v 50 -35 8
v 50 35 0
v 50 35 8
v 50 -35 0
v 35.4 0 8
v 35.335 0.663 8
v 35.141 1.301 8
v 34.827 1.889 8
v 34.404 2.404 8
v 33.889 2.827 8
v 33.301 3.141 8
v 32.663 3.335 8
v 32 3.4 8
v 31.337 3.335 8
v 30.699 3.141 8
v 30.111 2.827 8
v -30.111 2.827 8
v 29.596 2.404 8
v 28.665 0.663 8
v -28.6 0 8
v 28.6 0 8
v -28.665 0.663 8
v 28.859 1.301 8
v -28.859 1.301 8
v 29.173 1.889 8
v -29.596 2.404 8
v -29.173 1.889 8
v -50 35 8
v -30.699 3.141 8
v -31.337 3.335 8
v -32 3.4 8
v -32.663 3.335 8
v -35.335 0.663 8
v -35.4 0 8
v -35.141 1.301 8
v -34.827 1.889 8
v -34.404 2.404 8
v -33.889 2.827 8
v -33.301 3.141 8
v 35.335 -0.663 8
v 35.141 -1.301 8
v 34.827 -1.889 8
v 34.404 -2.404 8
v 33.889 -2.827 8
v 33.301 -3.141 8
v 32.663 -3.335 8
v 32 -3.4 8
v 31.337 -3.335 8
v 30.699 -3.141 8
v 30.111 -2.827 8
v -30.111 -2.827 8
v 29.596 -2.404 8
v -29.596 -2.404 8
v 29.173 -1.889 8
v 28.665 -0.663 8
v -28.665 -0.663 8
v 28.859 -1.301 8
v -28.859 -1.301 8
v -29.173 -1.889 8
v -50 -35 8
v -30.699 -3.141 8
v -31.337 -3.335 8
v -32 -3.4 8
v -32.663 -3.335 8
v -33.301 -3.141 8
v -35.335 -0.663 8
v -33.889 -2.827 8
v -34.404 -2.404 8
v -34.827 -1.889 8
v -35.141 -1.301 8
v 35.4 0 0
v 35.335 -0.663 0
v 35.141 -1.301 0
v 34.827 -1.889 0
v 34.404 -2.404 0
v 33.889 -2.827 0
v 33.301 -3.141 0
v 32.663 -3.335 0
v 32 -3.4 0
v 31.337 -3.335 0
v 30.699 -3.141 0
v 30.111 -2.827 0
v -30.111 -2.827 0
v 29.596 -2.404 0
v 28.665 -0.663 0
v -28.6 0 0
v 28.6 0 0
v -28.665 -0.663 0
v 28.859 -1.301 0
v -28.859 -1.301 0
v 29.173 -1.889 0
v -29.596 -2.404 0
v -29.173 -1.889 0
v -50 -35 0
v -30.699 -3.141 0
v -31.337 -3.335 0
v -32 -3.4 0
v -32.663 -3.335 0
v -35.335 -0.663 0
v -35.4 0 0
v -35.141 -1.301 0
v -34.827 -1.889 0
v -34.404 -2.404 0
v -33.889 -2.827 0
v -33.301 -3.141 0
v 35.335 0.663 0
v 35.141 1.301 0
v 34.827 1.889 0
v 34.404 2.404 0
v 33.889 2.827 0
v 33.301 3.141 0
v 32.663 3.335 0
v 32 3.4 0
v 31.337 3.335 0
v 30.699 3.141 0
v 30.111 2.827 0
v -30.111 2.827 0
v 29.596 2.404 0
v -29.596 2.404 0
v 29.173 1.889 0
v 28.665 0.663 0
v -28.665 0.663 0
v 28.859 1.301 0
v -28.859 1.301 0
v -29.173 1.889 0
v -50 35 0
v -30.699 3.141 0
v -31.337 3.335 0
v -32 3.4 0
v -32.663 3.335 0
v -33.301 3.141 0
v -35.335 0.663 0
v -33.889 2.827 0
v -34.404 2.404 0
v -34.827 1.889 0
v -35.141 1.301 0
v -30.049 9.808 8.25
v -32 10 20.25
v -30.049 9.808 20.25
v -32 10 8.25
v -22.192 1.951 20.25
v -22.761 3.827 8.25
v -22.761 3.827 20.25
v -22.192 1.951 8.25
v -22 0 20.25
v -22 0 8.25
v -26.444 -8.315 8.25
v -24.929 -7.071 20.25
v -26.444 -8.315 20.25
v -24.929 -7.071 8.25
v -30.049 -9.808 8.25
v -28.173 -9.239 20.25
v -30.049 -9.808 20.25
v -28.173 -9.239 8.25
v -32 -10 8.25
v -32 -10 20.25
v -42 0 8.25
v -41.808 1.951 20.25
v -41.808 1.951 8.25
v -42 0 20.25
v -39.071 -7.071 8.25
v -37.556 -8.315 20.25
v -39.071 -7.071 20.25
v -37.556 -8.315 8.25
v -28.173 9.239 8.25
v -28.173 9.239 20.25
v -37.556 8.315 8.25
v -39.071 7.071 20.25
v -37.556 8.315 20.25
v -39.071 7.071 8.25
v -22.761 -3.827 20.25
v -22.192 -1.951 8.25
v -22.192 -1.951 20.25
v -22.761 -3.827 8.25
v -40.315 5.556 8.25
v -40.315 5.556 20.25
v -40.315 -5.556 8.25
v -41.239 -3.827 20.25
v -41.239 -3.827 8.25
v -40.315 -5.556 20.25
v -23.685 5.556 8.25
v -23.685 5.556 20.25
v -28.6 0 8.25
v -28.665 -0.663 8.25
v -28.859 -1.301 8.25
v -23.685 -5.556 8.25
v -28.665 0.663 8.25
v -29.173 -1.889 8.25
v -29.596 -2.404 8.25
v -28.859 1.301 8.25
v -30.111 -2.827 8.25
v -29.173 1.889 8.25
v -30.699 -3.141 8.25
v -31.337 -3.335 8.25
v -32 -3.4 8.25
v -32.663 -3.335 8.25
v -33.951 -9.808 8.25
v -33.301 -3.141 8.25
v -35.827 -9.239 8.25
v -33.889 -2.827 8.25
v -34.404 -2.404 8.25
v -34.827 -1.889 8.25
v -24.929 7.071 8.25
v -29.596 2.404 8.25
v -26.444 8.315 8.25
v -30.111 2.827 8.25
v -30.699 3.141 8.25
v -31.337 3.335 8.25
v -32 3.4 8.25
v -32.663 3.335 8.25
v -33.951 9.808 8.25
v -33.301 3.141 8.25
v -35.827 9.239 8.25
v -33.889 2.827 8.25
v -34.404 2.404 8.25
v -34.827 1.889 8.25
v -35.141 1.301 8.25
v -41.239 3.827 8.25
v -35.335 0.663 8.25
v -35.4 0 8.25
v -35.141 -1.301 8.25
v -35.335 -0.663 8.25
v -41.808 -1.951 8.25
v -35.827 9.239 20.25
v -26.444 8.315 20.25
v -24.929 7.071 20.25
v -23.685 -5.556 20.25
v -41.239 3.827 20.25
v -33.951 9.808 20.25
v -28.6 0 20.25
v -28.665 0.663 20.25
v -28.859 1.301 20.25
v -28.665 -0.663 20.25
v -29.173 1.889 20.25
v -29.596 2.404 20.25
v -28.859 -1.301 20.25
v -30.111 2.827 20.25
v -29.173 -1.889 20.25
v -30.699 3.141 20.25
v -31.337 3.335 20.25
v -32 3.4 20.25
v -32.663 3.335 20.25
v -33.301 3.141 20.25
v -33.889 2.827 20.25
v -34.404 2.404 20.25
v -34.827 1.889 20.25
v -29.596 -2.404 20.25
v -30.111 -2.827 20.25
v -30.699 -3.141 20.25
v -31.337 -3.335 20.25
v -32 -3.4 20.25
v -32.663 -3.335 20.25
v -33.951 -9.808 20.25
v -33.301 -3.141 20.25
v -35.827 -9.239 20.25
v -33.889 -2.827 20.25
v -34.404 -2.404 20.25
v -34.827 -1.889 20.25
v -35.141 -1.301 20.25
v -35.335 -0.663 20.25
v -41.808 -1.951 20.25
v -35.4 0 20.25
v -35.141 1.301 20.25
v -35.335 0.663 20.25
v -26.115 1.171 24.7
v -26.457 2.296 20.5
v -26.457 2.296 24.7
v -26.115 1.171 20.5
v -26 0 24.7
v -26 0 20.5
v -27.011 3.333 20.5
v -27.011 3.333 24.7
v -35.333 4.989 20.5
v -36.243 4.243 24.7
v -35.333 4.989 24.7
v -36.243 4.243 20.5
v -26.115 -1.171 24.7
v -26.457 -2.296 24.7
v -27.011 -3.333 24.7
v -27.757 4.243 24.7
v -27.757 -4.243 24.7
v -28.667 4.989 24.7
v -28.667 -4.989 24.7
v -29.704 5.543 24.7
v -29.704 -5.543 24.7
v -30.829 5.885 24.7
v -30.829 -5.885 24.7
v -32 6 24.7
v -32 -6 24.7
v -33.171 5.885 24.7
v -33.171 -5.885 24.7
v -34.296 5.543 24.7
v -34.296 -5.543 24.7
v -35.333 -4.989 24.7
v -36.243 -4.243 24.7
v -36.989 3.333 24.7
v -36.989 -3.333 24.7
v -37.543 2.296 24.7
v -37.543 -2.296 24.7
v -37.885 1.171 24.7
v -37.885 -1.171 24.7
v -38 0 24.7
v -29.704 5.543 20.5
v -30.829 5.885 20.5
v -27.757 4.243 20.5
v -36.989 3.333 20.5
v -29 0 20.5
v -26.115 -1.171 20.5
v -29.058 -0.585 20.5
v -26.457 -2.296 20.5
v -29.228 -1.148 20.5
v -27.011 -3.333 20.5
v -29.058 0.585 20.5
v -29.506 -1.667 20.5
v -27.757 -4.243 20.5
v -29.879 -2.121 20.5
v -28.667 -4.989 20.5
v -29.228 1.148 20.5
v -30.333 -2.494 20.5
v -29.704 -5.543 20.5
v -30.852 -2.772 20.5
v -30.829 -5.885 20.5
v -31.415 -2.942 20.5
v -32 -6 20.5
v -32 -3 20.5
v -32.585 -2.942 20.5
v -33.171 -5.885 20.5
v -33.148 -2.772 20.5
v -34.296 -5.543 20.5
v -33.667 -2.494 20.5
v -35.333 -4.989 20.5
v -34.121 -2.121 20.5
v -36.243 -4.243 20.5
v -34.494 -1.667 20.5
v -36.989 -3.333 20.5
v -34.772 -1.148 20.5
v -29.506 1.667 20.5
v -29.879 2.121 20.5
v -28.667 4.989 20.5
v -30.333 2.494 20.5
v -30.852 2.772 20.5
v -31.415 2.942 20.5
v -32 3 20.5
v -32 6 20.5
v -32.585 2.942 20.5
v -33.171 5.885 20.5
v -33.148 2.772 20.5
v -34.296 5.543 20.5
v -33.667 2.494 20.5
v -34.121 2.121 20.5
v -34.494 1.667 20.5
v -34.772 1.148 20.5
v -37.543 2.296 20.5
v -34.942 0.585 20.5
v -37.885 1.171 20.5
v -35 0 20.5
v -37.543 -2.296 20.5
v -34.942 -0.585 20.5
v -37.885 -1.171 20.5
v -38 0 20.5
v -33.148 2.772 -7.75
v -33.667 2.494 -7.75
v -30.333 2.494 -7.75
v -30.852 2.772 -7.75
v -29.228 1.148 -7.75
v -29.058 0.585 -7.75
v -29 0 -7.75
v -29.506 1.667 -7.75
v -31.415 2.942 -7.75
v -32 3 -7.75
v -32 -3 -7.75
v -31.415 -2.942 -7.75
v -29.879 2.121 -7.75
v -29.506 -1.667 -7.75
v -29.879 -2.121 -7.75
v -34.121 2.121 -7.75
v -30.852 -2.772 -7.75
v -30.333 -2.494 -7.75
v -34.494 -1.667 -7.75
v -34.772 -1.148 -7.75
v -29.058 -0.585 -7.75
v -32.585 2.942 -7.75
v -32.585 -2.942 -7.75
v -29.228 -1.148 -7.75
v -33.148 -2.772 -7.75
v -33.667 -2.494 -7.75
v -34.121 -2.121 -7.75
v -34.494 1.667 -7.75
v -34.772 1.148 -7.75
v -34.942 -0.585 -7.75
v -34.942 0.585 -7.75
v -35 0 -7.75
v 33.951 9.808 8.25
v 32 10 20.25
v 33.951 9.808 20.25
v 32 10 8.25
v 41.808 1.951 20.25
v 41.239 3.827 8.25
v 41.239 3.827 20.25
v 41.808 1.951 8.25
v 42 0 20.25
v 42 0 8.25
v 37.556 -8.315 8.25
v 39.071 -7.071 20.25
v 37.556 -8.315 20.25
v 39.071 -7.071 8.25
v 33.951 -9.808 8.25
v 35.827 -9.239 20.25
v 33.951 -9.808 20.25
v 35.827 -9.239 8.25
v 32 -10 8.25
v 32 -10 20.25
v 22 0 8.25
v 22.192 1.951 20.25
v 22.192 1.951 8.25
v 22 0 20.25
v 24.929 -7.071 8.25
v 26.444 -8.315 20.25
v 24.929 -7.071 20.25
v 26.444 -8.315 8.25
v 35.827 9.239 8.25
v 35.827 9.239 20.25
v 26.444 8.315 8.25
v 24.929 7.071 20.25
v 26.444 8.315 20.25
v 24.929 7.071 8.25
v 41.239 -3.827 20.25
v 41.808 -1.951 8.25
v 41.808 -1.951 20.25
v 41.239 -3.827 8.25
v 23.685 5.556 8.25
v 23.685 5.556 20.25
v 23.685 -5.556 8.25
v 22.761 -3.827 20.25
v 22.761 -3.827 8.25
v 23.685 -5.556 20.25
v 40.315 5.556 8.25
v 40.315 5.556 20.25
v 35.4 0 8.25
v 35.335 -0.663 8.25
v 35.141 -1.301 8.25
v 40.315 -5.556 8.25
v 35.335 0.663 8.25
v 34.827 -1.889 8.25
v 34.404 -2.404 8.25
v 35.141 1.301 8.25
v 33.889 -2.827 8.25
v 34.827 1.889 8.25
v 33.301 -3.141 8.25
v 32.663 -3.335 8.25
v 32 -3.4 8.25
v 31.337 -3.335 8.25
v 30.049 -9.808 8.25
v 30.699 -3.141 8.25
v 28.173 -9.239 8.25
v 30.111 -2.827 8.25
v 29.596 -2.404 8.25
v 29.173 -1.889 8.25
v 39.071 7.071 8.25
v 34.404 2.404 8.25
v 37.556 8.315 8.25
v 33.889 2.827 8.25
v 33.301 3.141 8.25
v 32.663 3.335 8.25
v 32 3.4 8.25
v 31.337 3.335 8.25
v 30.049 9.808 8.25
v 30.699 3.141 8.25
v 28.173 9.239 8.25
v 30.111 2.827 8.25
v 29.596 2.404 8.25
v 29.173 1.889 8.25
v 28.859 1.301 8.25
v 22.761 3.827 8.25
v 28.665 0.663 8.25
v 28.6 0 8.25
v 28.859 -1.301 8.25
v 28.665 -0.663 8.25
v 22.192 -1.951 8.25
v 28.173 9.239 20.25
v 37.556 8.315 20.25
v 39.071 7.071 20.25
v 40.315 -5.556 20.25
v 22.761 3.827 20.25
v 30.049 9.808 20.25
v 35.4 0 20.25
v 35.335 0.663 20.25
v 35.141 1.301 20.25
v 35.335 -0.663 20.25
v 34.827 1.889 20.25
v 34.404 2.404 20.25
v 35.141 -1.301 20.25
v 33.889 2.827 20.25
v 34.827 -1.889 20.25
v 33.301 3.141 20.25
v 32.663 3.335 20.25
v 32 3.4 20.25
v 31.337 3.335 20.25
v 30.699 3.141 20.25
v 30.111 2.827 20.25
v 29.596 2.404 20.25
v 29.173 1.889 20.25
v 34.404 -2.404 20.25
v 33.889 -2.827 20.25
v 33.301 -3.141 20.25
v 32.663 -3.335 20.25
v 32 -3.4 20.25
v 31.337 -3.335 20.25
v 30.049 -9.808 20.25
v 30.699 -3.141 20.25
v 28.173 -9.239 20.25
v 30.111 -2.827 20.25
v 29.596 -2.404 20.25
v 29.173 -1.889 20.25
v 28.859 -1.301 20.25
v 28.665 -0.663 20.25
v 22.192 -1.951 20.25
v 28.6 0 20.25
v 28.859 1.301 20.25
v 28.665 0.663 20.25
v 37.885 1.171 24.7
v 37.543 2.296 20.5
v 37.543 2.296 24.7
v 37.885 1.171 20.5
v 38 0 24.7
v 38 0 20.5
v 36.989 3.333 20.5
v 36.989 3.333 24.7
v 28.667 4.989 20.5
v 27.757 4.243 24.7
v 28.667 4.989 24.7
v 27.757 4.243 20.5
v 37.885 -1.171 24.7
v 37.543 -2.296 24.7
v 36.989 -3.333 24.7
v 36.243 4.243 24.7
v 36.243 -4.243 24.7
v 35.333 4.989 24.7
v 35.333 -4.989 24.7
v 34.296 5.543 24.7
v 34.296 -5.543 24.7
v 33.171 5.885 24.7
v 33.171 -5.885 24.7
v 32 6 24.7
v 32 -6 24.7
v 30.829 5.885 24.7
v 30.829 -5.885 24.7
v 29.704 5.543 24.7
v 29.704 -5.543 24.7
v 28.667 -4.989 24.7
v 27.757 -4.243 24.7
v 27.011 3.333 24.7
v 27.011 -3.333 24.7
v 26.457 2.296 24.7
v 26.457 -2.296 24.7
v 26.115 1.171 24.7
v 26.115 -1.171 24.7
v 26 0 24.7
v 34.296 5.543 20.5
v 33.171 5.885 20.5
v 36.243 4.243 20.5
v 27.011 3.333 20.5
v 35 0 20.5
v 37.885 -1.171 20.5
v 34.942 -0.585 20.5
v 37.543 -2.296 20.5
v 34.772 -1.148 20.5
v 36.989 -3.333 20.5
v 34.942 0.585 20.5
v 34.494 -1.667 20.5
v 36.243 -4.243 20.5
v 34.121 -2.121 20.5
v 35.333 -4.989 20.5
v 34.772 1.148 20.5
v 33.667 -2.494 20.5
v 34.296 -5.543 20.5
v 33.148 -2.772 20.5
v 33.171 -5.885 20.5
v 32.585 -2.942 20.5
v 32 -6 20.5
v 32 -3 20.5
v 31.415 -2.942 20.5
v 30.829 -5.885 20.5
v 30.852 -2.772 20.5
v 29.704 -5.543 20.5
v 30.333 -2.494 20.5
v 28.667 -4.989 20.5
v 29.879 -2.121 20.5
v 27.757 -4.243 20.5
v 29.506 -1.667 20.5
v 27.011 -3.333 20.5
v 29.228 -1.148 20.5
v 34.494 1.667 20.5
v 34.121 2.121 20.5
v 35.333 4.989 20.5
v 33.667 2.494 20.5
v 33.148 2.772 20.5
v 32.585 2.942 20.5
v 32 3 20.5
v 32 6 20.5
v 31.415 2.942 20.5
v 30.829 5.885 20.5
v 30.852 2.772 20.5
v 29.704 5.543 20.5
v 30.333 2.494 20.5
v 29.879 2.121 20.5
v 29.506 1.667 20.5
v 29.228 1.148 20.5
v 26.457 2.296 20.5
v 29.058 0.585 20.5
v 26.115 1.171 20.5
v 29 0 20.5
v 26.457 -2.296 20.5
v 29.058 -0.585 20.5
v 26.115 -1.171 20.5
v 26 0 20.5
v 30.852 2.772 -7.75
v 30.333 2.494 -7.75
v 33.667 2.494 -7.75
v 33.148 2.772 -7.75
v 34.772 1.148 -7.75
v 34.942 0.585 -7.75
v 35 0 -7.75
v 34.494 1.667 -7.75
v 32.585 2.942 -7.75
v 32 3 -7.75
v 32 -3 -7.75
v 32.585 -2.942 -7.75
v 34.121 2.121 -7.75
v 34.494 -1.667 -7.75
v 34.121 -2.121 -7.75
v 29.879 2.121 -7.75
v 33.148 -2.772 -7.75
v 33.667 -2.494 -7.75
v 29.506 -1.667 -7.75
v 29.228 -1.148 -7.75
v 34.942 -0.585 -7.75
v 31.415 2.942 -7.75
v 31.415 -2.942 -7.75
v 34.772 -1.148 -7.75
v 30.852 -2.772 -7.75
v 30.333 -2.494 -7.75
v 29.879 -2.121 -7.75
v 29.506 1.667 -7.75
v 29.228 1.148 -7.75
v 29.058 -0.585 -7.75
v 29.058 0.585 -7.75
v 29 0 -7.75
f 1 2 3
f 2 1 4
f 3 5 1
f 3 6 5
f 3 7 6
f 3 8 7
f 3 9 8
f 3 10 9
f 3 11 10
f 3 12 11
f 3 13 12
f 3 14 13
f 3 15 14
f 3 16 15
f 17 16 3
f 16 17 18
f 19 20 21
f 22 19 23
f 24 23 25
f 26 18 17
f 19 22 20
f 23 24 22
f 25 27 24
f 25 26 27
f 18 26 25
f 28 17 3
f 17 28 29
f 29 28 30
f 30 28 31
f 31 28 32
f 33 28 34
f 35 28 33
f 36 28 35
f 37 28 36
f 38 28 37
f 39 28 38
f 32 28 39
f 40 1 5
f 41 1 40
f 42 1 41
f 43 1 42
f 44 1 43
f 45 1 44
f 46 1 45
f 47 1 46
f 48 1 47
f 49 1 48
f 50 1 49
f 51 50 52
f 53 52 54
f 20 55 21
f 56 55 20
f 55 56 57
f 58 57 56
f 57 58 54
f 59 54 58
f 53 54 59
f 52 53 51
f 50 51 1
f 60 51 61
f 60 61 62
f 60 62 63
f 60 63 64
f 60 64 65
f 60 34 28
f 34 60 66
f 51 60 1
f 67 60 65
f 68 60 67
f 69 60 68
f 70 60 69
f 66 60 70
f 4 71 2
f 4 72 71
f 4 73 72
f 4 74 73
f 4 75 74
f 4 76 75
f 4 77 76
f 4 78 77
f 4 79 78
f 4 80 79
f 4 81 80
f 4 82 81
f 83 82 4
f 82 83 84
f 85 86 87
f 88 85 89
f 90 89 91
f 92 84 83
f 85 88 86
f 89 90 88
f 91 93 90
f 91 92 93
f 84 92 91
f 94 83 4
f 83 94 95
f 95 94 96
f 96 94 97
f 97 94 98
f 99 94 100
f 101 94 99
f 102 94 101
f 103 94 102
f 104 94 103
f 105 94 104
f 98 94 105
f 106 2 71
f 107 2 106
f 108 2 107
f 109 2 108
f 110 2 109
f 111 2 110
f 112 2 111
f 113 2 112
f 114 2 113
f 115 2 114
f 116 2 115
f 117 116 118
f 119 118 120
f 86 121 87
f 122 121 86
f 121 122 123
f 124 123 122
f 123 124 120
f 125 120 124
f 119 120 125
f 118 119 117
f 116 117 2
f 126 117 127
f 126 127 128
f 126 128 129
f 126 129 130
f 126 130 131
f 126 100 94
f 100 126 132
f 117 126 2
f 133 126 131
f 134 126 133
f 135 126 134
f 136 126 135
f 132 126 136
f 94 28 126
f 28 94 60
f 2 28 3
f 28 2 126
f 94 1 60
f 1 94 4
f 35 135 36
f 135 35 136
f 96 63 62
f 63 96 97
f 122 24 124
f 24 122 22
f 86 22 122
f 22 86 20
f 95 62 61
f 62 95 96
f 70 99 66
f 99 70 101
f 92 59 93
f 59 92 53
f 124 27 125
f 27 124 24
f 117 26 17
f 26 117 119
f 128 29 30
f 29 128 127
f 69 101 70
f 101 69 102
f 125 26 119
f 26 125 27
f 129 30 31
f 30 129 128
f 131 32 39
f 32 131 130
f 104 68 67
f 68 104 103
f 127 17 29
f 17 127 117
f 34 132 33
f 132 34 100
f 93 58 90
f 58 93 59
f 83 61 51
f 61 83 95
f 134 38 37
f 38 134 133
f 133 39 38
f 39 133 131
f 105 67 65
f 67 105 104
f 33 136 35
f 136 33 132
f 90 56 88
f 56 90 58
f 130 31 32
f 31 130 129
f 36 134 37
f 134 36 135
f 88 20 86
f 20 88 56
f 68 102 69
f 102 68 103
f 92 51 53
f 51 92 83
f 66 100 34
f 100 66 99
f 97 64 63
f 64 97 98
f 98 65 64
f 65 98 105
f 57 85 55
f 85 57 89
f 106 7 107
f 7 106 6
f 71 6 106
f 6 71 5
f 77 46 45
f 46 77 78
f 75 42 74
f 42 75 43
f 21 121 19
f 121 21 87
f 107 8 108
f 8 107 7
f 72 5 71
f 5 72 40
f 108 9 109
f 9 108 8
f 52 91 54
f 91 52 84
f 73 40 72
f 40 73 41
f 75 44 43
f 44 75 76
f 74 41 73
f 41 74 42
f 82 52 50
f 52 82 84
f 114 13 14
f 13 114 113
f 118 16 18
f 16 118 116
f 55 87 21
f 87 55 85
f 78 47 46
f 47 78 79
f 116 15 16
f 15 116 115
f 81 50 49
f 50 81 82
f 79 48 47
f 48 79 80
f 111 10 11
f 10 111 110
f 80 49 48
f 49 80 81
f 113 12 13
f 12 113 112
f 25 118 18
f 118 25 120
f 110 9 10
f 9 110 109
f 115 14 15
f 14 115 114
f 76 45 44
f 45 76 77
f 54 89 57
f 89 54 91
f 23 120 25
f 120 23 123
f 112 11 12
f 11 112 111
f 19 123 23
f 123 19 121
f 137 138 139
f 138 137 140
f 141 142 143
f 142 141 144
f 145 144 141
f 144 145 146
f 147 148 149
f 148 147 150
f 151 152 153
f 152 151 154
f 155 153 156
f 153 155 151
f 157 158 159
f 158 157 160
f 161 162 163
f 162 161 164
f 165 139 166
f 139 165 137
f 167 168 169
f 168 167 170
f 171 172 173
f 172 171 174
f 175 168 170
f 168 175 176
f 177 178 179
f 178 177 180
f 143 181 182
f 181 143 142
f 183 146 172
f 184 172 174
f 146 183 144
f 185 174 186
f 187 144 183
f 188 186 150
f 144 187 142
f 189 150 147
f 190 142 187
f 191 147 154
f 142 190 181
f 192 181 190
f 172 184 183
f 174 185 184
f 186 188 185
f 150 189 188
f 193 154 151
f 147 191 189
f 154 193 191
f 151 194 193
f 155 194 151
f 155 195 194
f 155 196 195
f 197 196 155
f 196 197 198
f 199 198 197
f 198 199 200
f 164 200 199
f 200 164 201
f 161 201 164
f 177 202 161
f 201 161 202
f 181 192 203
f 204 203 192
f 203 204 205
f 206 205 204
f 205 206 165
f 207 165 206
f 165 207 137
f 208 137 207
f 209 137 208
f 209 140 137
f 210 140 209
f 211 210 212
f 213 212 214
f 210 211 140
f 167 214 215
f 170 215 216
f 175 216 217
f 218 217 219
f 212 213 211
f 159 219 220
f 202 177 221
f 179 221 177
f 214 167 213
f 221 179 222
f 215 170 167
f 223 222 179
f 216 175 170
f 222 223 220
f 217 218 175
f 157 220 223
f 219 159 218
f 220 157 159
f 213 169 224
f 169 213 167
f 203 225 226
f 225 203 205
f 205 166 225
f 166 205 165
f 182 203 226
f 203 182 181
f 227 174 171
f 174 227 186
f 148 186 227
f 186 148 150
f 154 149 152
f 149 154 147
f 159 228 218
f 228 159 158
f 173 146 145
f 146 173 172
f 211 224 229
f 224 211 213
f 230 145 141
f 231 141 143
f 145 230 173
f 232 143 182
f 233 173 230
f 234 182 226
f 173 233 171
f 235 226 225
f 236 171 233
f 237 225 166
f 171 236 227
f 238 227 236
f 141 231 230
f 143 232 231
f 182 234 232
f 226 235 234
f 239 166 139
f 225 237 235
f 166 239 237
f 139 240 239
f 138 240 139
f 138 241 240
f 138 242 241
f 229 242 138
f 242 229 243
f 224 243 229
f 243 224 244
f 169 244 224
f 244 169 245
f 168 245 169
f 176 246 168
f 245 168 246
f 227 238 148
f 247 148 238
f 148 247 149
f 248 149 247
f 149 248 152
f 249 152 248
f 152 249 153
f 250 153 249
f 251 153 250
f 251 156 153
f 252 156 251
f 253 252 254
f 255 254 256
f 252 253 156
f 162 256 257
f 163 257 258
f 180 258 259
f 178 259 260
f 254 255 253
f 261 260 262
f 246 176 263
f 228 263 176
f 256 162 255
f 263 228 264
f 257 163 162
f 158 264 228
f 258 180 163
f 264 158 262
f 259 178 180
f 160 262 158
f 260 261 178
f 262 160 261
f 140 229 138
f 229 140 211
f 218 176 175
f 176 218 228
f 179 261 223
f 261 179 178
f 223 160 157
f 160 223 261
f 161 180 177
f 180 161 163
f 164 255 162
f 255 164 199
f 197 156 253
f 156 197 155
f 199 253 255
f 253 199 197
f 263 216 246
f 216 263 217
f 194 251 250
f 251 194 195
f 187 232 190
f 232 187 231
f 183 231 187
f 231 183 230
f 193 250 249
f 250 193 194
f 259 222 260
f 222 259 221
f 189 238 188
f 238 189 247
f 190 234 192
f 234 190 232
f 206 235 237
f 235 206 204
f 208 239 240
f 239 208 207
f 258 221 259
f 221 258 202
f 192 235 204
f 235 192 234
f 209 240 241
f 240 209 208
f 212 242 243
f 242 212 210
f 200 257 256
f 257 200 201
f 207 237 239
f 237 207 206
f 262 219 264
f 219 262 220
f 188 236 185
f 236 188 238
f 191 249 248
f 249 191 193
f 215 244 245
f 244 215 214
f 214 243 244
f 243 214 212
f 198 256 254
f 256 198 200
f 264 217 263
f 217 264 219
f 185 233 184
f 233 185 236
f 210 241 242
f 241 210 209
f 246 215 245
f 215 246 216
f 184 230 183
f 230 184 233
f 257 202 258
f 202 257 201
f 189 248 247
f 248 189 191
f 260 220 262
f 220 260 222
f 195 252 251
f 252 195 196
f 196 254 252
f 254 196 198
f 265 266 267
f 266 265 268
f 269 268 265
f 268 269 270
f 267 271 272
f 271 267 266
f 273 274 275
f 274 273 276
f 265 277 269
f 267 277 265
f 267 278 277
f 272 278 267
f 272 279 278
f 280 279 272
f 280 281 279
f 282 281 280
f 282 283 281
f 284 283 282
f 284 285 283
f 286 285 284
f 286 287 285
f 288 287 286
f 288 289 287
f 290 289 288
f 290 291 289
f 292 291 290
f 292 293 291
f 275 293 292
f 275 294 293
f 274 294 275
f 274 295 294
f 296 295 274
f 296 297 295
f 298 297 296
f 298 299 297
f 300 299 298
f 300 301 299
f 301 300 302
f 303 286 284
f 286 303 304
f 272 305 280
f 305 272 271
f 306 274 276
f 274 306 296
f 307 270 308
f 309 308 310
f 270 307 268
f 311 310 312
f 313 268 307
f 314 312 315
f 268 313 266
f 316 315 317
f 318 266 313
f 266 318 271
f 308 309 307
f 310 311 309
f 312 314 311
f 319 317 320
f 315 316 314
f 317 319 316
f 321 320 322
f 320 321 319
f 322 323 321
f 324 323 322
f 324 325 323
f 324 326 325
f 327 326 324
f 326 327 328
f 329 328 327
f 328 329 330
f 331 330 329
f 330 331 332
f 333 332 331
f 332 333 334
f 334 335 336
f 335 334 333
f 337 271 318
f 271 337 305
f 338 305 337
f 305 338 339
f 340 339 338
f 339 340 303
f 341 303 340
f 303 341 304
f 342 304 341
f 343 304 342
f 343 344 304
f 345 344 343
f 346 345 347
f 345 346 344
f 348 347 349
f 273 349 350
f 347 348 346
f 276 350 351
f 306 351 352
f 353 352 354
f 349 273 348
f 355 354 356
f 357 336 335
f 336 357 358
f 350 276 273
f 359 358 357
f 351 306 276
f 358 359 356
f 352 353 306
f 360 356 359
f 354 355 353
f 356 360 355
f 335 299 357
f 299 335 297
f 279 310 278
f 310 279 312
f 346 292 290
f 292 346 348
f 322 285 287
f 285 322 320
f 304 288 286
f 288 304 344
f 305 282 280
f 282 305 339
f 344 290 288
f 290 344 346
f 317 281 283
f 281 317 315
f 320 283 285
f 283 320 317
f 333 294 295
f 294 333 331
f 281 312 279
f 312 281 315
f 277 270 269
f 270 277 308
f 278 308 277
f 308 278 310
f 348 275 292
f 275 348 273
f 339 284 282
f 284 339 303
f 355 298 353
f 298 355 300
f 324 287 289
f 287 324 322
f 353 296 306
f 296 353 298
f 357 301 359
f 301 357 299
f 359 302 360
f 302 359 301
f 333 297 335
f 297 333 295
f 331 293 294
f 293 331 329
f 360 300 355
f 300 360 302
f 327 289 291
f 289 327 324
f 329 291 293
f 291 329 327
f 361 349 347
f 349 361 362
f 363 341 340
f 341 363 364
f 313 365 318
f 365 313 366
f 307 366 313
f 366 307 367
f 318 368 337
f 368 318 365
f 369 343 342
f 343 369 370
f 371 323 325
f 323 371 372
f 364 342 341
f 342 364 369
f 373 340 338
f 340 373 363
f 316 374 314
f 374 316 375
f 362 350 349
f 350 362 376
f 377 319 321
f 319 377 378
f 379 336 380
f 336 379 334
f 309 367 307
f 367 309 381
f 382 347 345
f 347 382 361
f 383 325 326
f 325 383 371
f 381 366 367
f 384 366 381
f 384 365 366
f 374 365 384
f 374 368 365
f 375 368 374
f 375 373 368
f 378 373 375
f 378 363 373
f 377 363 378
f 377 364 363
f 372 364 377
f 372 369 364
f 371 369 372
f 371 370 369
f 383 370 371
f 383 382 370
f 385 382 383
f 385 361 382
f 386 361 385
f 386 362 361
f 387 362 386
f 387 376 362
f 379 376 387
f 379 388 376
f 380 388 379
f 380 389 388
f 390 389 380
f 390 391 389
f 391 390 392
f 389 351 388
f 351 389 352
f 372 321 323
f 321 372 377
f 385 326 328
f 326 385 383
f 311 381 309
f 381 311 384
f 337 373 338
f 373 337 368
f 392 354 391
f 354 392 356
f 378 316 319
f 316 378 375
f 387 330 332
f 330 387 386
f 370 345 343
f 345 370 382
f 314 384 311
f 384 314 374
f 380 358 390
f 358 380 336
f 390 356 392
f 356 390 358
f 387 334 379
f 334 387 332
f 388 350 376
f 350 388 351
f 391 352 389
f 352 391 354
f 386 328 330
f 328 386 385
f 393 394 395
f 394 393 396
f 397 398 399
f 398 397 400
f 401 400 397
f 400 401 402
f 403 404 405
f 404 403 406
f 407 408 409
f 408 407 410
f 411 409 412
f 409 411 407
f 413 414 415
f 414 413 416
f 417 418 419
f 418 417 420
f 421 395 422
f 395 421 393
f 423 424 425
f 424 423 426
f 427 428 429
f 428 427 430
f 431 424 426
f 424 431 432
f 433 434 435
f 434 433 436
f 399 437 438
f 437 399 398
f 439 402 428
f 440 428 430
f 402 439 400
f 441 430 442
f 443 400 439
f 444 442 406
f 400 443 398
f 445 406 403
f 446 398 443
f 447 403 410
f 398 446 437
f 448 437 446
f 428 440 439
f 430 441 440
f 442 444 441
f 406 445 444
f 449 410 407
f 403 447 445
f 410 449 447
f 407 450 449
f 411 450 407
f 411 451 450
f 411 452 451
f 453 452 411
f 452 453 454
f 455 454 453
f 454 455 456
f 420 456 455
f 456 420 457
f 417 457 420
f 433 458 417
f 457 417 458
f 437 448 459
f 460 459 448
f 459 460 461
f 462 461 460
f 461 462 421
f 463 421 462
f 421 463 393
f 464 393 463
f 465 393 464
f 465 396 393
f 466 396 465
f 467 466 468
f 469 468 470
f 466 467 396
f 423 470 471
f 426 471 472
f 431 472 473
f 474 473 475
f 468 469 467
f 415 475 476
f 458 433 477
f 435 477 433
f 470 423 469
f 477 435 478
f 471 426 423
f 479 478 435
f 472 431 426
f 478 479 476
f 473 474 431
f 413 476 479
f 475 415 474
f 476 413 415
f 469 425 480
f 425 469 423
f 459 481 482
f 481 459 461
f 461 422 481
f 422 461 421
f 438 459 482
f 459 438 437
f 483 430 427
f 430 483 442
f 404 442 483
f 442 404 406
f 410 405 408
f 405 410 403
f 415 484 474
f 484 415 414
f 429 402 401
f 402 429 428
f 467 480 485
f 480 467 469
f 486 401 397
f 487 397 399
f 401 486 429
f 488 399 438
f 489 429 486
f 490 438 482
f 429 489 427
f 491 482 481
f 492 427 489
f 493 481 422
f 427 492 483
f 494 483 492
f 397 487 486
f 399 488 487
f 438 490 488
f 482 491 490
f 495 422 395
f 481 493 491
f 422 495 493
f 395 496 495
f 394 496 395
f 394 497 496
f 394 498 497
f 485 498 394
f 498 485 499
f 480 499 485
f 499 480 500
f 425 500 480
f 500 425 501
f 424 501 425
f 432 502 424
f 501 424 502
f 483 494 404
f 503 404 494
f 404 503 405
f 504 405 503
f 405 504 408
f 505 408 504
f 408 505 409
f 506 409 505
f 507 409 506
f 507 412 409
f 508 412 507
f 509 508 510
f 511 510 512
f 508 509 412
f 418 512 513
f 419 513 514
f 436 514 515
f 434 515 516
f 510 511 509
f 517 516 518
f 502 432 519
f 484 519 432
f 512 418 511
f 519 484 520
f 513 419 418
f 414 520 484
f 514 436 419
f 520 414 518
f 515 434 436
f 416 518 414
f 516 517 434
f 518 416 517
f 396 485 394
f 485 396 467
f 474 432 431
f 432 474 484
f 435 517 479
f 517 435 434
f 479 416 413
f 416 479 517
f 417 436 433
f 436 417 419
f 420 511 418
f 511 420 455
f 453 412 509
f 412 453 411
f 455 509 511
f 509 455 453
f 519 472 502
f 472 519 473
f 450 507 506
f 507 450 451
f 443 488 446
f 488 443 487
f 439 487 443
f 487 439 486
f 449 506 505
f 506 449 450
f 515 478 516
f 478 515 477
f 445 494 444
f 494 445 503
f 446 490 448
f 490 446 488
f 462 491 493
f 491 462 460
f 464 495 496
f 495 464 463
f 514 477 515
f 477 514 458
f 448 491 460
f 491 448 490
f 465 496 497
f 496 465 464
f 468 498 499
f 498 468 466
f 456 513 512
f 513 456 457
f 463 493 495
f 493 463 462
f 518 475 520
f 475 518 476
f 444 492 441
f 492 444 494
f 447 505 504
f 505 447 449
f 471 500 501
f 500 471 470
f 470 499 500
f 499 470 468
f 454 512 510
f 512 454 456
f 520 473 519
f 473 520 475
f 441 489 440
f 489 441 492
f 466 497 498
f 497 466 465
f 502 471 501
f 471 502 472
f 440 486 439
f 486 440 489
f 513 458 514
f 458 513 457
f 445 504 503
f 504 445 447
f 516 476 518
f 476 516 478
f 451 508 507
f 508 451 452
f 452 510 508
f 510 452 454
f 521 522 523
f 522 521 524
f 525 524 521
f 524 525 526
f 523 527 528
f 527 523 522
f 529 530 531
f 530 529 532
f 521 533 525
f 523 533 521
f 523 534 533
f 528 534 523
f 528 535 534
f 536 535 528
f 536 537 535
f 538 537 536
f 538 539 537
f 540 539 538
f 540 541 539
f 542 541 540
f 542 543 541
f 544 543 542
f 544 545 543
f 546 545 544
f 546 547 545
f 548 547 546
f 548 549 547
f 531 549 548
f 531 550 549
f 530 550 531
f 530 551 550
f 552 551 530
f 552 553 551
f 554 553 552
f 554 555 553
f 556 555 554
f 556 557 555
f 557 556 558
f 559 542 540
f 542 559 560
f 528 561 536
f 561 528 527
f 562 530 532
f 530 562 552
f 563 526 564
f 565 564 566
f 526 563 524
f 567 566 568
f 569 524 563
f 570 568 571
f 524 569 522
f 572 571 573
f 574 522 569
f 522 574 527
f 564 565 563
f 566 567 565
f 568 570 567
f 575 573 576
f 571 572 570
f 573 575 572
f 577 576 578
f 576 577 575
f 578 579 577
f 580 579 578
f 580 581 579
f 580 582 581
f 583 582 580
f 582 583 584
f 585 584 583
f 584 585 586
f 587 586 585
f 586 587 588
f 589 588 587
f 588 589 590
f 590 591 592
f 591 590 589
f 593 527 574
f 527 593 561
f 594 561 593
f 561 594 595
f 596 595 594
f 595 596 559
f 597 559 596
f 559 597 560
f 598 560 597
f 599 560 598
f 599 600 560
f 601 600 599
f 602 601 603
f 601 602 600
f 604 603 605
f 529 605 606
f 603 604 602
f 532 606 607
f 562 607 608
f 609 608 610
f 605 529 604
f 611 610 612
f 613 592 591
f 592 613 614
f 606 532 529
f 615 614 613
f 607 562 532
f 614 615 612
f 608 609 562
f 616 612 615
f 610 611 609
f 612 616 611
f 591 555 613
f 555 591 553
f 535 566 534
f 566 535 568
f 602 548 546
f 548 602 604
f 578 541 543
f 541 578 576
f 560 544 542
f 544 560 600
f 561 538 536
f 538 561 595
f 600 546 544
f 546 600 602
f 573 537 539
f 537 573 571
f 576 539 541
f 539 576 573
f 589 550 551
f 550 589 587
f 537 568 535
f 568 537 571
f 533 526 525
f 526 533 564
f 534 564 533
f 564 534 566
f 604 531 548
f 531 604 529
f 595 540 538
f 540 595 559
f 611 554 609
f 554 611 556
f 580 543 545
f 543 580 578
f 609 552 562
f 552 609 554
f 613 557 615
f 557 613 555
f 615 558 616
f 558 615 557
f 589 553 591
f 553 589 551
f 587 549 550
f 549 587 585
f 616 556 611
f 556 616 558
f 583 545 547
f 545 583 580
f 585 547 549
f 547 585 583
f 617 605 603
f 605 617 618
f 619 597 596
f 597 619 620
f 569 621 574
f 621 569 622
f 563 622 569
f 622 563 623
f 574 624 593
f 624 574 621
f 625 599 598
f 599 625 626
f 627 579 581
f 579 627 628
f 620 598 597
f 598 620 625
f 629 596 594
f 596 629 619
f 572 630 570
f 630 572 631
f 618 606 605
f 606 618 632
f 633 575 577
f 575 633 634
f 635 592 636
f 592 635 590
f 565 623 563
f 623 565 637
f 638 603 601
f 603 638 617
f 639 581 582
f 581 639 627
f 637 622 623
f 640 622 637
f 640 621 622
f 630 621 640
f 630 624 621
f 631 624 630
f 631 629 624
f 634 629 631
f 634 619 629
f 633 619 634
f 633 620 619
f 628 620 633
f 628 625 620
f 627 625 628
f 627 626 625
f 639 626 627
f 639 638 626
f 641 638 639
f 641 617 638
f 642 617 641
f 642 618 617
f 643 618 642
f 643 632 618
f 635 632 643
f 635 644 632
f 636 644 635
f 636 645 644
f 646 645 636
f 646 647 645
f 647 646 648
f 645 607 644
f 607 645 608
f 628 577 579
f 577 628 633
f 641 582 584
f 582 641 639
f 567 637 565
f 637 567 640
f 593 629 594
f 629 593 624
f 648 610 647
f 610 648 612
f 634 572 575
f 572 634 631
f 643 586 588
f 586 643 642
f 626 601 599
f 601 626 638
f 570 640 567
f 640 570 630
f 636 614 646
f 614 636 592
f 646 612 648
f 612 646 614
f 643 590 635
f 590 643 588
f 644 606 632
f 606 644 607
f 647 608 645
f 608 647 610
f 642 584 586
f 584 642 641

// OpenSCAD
$fn = 32;

// ------------------------------------------------------------------------
// Standoff columns: 2 d20 standoffs, bolts d6
// Every part is its own module, assembly() places them once.
// ------------------------------------------------------------------------

// --- part 1 ---
module base_plate() {
  difference() {
    translate([-50, -35, 0]) cube([100, 70, 8]);
    translate([-32, 0, -1]) cylinder(h = 10, d = 6.8);
    translate([32, 0, -1]) cylinder(h = 10, d = 6.8);
  }
}

// --- part 2 ---
module spacer1() {
  difference() {
      translate([0, 0, 0]) cylinder(h = 12, d = 20);
      translate([0, 0, -1]) cylinder(h = 14, d = 6.8);
    }
}

// --- part 3 ---
module bolt1() {
  cylinder(h = 4.2, d = 12);
  translate([0, 0, -28.25]) cylinder(h = 28.25, d = 6);
}

// --- part 4 ---
module spacer2() {
  difference() {
      translate([0, 0, 0]) cylinder(h = 12, d = 20);
      translate([0, 0, -1]) cylinder(h = 14, d = 6.8);
    }
}

// --- part 5 ---
module bolt2() {
  cylinder(h = 4.2, d = 12);
  translate([0, 0, -28.25]) cylinder(h = 28.25, d = 6);
}

// --- assembly ---
module assembly() {
  translate([0, 0, 0]) rotate([0, 0, 0]) base_plate();
  translate([-32, 0, 8.25]) rotate([0, 0, 0]) spacer1();
  translate([-32, 0, 20.5]) rotate([0, 0, 0]) bolt1();
  translate([32, 0, 8.25]) rotate([0, 0, 0]) spacer2();
  translate([32, 0, 20.5]) rotate([0, 0, 0]) bolt2();
}

assembly();
